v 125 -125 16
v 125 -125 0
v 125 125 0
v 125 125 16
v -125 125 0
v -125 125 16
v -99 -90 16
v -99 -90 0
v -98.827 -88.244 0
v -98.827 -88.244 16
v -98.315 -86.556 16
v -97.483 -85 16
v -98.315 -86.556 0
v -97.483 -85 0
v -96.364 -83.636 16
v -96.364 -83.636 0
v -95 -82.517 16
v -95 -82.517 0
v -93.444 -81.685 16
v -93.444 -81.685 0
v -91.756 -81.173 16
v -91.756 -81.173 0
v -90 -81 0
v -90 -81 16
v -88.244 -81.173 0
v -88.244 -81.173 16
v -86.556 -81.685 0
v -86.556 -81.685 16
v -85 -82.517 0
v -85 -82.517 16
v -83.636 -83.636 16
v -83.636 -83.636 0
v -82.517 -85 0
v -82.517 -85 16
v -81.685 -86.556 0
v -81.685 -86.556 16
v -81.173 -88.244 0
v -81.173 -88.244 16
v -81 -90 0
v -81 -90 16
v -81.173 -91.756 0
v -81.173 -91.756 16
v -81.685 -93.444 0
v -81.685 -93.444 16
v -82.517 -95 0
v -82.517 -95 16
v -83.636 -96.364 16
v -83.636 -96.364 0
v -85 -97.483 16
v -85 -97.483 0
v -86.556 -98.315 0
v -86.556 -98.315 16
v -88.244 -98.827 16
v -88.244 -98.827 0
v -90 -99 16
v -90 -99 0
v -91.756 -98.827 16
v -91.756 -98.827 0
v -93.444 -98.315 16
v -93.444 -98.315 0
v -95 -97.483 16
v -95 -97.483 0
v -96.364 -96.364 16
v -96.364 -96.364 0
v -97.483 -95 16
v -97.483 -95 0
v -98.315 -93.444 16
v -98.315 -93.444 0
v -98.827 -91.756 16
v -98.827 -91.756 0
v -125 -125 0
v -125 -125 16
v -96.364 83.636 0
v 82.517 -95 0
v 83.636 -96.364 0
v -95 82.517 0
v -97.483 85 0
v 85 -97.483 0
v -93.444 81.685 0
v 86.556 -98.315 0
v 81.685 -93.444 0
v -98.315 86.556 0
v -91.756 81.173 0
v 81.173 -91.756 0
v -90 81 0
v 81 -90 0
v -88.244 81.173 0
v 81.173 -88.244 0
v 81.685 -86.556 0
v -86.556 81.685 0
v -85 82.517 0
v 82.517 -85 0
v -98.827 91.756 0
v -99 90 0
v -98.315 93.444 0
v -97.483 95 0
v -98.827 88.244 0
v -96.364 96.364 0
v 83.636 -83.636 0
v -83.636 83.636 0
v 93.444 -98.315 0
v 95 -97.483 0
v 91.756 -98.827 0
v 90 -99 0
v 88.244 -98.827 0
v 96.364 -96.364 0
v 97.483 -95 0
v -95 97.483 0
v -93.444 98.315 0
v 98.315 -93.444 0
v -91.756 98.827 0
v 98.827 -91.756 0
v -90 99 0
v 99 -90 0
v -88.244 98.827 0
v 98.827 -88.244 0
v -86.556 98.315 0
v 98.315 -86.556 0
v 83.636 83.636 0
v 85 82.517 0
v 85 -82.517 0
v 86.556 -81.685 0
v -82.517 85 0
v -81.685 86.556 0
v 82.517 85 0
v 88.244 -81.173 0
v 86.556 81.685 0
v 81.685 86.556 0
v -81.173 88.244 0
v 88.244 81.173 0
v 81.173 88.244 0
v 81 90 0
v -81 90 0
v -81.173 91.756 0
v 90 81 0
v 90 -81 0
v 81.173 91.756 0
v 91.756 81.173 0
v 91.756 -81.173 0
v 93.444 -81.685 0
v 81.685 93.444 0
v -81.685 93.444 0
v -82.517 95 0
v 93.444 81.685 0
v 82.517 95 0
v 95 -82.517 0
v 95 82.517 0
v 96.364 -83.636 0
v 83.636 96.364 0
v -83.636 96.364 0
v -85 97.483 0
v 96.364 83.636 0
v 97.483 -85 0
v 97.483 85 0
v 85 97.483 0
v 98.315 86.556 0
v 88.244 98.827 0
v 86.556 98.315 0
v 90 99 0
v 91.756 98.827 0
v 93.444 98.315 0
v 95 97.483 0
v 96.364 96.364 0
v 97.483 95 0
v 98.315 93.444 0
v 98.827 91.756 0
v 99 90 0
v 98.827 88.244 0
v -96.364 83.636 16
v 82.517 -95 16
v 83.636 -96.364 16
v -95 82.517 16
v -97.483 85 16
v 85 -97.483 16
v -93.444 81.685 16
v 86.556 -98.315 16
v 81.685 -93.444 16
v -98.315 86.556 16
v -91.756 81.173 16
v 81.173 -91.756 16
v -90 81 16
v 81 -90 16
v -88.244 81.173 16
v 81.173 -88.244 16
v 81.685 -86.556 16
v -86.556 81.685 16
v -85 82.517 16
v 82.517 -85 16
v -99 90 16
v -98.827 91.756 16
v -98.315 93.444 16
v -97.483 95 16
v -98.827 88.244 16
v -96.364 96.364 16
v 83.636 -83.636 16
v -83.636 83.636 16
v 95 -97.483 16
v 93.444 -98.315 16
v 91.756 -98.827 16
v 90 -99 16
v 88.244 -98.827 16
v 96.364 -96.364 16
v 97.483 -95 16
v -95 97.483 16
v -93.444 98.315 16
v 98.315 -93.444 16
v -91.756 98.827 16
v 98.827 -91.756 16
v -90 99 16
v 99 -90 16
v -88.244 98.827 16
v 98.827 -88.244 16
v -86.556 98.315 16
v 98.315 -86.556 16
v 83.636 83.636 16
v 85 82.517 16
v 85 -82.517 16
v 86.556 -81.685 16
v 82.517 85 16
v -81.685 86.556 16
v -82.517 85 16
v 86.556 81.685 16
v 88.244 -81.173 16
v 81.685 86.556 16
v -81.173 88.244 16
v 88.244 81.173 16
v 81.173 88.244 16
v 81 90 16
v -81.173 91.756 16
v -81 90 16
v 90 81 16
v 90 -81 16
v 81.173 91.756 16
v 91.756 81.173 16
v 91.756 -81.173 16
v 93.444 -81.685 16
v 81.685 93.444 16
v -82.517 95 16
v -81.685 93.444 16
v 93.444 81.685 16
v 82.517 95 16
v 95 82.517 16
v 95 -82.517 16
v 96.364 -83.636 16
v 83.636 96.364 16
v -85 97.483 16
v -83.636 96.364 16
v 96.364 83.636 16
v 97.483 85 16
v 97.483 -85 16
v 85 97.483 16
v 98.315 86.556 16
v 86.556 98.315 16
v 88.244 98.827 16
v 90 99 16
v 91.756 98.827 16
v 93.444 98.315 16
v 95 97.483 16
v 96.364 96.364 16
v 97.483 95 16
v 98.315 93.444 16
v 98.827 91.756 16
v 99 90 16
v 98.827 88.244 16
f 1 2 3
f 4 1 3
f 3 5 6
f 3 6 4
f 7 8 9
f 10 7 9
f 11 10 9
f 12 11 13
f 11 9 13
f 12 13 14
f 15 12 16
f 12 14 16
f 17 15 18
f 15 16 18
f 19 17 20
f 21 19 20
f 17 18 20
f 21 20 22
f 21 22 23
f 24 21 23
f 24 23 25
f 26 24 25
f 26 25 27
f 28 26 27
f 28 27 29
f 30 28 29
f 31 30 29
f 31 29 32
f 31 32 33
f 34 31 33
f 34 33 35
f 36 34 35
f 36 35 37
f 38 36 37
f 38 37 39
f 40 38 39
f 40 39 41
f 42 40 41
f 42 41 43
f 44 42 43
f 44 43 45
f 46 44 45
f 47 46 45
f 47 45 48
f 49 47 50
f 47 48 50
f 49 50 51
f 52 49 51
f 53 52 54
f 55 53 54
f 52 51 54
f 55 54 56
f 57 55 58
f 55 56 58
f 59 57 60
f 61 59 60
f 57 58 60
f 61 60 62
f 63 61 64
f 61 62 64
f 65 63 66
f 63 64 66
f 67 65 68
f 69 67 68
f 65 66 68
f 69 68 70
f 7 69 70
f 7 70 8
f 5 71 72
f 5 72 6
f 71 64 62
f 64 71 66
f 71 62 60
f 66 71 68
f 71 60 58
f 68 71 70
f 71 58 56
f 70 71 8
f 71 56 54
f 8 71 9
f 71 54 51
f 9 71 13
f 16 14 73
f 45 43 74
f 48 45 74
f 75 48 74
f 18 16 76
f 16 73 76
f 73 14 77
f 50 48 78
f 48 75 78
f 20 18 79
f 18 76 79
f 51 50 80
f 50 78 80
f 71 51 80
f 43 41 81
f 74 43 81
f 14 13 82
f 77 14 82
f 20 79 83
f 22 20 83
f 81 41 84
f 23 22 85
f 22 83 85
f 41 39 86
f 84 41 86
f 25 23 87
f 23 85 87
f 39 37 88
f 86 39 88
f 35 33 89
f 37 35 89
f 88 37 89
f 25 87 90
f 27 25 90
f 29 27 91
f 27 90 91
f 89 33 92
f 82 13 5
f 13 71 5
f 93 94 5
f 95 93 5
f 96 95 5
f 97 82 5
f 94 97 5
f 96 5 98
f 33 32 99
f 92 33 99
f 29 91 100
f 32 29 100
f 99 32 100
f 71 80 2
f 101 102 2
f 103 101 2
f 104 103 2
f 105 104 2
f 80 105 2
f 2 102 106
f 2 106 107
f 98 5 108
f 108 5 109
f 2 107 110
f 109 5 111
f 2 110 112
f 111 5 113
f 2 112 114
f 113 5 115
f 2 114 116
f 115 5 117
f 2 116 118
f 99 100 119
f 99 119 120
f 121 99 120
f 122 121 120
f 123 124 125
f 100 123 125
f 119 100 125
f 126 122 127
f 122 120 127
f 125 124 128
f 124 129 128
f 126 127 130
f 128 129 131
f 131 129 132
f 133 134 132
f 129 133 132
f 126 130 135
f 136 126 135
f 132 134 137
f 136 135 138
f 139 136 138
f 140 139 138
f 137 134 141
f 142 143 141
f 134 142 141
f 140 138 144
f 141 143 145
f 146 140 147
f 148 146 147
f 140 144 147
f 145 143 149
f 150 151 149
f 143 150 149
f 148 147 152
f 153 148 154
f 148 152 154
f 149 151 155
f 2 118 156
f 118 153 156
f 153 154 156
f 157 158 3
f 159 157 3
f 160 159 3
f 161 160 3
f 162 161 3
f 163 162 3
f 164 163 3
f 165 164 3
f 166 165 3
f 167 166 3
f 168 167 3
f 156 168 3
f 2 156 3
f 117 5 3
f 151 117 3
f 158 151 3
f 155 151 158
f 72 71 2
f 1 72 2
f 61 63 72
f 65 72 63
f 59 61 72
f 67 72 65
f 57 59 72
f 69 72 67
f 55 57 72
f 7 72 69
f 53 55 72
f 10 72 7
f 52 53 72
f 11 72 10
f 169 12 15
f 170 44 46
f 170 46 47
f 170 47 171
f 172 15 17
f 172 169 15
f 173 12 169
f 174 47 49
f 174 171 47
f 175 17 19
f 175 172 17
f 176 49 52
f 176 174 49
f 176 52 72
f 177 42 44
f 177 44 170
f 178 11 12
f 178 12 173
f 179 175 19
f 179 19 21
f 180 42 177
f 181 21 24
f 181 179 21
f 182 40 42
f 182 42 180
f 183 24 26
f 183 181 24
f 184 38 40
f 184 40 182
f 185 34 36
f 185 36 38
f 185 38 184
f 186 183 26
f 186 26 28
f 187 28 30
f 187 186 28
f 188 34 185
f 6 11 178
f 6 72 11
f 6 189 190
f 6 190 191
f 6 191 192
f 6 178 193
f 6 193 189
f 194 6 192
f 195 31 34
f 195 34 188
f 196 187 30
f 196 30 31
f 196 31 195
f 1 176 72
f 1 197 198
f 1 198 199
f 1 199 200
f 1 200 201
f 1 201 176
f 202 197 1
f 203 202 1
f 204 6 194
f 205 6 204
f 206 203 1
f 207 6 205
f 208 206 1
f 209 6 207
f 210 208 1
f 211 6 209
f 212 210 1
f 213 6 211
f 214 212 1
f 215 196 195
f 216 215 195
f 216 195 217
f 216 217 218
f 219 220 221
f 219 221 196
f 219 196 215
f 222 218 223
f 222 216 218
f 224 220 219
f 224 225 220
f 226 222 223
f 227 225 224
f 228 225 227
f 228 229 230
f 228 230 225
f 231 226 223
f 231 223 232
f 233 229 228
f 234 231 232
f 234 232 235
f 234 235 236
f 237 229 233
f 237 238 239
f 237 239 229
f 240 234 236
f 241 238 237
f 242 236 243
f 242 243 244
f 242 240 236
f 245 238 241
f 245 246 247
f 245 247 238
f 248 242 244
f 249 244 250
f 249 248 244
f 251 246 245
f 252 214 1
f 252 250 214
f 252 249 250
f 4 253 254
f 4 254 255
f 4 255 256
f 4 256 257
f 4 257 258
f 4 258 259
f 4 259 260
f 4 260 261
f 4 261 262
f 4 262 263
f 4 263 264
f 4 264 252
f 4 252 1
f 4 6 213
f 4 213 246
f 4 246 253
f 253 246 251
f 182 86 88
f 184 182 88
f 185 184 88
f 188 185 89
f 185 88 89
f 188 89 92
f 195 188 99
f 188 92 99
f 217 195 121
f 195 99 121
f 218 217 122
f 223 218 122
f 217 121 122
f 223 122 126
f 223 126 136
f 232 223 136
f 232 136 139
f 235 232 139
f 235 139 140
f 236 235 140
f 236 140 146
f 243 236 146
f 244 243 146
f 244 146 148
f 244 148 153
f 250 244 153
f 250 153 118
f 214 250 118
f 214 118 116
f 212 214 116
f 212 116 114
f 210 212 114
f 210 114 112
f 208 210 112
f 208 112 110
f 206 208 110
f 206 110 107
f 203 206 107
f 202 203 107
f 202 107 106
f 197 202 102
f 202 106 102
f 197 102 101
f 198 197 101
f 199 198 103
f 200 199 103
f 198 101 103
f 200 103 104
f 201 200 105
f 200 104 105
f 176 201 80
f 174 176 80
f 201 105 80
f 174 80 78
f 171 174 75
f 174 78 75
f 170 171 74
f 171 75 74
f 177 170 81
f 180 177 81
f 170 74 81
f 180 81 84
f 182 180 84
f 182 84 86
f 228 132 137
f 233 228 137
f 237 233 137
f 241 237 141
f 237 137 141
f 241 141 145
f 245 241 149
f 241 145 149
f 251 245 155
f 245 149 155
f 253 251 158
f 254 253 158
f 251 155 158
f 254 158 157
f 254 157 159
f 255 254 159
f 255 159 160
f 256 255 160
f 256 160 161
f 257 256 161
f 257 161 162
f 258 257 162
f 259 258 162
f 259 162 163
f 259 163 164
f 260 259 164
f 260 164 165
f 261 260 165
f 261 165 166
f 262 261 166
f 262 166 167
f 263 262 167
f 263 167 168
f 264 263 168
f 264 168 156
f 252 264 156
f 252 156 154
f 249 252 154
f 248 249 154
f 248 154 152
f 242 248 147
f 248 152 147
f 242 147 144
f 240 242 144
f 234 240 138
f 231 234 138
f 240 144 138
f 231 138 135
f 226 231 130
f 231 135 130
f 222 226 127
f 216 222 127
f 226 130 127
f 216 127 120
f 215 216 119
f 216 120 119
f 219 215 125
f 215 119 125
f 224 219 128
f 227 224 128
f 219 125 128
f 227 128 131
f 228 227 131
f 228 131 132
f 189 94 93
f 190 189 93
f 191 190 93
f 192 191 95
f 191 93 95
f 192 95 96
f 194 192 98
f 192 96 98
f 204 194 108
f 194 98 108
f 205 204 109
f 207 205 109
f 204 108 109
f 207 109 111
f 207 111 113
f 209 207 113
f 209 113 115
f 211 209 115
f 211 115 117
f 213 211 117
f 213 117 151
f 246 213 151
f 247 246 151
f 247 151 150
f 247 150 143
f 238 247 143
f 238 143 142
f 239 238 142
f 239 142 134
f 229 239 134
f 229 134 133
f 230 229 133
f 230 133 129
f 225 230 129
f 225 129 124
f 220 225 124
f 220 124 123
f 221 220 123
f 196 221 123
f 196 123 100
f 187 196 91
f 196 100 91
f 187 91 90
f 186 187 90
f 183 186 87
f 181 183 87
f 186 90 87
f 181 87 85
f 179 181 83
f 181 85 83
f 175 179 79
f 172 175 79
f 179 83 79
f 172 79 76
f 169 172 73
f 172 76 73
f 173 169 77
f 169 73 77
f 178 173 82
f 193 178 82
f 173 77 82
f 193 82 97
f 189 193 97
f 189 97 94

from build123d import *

# Parameters (mm, degrees)
F0_W     = 250
F0_H     = 250
F1_DEPTH = 16
F3_D     = 18
F3_DEPTH = 20


with BuildPart() as f1:
    # F0 (on Top) → F1 (new body)
    with BuildSketch(Plane.XY):
        Rectangle(F0_W, F0_H)
    extrude(amount=F1_DEPTH)

    # F3
    with Locations(Plane.XY.offset(16)):
        with Locations((-90, 90), (90, 90), (90, -90), (-90, -90)):
            Hole(F3_D / 2, depth=F3_DEPTH)


solid = f1.part
